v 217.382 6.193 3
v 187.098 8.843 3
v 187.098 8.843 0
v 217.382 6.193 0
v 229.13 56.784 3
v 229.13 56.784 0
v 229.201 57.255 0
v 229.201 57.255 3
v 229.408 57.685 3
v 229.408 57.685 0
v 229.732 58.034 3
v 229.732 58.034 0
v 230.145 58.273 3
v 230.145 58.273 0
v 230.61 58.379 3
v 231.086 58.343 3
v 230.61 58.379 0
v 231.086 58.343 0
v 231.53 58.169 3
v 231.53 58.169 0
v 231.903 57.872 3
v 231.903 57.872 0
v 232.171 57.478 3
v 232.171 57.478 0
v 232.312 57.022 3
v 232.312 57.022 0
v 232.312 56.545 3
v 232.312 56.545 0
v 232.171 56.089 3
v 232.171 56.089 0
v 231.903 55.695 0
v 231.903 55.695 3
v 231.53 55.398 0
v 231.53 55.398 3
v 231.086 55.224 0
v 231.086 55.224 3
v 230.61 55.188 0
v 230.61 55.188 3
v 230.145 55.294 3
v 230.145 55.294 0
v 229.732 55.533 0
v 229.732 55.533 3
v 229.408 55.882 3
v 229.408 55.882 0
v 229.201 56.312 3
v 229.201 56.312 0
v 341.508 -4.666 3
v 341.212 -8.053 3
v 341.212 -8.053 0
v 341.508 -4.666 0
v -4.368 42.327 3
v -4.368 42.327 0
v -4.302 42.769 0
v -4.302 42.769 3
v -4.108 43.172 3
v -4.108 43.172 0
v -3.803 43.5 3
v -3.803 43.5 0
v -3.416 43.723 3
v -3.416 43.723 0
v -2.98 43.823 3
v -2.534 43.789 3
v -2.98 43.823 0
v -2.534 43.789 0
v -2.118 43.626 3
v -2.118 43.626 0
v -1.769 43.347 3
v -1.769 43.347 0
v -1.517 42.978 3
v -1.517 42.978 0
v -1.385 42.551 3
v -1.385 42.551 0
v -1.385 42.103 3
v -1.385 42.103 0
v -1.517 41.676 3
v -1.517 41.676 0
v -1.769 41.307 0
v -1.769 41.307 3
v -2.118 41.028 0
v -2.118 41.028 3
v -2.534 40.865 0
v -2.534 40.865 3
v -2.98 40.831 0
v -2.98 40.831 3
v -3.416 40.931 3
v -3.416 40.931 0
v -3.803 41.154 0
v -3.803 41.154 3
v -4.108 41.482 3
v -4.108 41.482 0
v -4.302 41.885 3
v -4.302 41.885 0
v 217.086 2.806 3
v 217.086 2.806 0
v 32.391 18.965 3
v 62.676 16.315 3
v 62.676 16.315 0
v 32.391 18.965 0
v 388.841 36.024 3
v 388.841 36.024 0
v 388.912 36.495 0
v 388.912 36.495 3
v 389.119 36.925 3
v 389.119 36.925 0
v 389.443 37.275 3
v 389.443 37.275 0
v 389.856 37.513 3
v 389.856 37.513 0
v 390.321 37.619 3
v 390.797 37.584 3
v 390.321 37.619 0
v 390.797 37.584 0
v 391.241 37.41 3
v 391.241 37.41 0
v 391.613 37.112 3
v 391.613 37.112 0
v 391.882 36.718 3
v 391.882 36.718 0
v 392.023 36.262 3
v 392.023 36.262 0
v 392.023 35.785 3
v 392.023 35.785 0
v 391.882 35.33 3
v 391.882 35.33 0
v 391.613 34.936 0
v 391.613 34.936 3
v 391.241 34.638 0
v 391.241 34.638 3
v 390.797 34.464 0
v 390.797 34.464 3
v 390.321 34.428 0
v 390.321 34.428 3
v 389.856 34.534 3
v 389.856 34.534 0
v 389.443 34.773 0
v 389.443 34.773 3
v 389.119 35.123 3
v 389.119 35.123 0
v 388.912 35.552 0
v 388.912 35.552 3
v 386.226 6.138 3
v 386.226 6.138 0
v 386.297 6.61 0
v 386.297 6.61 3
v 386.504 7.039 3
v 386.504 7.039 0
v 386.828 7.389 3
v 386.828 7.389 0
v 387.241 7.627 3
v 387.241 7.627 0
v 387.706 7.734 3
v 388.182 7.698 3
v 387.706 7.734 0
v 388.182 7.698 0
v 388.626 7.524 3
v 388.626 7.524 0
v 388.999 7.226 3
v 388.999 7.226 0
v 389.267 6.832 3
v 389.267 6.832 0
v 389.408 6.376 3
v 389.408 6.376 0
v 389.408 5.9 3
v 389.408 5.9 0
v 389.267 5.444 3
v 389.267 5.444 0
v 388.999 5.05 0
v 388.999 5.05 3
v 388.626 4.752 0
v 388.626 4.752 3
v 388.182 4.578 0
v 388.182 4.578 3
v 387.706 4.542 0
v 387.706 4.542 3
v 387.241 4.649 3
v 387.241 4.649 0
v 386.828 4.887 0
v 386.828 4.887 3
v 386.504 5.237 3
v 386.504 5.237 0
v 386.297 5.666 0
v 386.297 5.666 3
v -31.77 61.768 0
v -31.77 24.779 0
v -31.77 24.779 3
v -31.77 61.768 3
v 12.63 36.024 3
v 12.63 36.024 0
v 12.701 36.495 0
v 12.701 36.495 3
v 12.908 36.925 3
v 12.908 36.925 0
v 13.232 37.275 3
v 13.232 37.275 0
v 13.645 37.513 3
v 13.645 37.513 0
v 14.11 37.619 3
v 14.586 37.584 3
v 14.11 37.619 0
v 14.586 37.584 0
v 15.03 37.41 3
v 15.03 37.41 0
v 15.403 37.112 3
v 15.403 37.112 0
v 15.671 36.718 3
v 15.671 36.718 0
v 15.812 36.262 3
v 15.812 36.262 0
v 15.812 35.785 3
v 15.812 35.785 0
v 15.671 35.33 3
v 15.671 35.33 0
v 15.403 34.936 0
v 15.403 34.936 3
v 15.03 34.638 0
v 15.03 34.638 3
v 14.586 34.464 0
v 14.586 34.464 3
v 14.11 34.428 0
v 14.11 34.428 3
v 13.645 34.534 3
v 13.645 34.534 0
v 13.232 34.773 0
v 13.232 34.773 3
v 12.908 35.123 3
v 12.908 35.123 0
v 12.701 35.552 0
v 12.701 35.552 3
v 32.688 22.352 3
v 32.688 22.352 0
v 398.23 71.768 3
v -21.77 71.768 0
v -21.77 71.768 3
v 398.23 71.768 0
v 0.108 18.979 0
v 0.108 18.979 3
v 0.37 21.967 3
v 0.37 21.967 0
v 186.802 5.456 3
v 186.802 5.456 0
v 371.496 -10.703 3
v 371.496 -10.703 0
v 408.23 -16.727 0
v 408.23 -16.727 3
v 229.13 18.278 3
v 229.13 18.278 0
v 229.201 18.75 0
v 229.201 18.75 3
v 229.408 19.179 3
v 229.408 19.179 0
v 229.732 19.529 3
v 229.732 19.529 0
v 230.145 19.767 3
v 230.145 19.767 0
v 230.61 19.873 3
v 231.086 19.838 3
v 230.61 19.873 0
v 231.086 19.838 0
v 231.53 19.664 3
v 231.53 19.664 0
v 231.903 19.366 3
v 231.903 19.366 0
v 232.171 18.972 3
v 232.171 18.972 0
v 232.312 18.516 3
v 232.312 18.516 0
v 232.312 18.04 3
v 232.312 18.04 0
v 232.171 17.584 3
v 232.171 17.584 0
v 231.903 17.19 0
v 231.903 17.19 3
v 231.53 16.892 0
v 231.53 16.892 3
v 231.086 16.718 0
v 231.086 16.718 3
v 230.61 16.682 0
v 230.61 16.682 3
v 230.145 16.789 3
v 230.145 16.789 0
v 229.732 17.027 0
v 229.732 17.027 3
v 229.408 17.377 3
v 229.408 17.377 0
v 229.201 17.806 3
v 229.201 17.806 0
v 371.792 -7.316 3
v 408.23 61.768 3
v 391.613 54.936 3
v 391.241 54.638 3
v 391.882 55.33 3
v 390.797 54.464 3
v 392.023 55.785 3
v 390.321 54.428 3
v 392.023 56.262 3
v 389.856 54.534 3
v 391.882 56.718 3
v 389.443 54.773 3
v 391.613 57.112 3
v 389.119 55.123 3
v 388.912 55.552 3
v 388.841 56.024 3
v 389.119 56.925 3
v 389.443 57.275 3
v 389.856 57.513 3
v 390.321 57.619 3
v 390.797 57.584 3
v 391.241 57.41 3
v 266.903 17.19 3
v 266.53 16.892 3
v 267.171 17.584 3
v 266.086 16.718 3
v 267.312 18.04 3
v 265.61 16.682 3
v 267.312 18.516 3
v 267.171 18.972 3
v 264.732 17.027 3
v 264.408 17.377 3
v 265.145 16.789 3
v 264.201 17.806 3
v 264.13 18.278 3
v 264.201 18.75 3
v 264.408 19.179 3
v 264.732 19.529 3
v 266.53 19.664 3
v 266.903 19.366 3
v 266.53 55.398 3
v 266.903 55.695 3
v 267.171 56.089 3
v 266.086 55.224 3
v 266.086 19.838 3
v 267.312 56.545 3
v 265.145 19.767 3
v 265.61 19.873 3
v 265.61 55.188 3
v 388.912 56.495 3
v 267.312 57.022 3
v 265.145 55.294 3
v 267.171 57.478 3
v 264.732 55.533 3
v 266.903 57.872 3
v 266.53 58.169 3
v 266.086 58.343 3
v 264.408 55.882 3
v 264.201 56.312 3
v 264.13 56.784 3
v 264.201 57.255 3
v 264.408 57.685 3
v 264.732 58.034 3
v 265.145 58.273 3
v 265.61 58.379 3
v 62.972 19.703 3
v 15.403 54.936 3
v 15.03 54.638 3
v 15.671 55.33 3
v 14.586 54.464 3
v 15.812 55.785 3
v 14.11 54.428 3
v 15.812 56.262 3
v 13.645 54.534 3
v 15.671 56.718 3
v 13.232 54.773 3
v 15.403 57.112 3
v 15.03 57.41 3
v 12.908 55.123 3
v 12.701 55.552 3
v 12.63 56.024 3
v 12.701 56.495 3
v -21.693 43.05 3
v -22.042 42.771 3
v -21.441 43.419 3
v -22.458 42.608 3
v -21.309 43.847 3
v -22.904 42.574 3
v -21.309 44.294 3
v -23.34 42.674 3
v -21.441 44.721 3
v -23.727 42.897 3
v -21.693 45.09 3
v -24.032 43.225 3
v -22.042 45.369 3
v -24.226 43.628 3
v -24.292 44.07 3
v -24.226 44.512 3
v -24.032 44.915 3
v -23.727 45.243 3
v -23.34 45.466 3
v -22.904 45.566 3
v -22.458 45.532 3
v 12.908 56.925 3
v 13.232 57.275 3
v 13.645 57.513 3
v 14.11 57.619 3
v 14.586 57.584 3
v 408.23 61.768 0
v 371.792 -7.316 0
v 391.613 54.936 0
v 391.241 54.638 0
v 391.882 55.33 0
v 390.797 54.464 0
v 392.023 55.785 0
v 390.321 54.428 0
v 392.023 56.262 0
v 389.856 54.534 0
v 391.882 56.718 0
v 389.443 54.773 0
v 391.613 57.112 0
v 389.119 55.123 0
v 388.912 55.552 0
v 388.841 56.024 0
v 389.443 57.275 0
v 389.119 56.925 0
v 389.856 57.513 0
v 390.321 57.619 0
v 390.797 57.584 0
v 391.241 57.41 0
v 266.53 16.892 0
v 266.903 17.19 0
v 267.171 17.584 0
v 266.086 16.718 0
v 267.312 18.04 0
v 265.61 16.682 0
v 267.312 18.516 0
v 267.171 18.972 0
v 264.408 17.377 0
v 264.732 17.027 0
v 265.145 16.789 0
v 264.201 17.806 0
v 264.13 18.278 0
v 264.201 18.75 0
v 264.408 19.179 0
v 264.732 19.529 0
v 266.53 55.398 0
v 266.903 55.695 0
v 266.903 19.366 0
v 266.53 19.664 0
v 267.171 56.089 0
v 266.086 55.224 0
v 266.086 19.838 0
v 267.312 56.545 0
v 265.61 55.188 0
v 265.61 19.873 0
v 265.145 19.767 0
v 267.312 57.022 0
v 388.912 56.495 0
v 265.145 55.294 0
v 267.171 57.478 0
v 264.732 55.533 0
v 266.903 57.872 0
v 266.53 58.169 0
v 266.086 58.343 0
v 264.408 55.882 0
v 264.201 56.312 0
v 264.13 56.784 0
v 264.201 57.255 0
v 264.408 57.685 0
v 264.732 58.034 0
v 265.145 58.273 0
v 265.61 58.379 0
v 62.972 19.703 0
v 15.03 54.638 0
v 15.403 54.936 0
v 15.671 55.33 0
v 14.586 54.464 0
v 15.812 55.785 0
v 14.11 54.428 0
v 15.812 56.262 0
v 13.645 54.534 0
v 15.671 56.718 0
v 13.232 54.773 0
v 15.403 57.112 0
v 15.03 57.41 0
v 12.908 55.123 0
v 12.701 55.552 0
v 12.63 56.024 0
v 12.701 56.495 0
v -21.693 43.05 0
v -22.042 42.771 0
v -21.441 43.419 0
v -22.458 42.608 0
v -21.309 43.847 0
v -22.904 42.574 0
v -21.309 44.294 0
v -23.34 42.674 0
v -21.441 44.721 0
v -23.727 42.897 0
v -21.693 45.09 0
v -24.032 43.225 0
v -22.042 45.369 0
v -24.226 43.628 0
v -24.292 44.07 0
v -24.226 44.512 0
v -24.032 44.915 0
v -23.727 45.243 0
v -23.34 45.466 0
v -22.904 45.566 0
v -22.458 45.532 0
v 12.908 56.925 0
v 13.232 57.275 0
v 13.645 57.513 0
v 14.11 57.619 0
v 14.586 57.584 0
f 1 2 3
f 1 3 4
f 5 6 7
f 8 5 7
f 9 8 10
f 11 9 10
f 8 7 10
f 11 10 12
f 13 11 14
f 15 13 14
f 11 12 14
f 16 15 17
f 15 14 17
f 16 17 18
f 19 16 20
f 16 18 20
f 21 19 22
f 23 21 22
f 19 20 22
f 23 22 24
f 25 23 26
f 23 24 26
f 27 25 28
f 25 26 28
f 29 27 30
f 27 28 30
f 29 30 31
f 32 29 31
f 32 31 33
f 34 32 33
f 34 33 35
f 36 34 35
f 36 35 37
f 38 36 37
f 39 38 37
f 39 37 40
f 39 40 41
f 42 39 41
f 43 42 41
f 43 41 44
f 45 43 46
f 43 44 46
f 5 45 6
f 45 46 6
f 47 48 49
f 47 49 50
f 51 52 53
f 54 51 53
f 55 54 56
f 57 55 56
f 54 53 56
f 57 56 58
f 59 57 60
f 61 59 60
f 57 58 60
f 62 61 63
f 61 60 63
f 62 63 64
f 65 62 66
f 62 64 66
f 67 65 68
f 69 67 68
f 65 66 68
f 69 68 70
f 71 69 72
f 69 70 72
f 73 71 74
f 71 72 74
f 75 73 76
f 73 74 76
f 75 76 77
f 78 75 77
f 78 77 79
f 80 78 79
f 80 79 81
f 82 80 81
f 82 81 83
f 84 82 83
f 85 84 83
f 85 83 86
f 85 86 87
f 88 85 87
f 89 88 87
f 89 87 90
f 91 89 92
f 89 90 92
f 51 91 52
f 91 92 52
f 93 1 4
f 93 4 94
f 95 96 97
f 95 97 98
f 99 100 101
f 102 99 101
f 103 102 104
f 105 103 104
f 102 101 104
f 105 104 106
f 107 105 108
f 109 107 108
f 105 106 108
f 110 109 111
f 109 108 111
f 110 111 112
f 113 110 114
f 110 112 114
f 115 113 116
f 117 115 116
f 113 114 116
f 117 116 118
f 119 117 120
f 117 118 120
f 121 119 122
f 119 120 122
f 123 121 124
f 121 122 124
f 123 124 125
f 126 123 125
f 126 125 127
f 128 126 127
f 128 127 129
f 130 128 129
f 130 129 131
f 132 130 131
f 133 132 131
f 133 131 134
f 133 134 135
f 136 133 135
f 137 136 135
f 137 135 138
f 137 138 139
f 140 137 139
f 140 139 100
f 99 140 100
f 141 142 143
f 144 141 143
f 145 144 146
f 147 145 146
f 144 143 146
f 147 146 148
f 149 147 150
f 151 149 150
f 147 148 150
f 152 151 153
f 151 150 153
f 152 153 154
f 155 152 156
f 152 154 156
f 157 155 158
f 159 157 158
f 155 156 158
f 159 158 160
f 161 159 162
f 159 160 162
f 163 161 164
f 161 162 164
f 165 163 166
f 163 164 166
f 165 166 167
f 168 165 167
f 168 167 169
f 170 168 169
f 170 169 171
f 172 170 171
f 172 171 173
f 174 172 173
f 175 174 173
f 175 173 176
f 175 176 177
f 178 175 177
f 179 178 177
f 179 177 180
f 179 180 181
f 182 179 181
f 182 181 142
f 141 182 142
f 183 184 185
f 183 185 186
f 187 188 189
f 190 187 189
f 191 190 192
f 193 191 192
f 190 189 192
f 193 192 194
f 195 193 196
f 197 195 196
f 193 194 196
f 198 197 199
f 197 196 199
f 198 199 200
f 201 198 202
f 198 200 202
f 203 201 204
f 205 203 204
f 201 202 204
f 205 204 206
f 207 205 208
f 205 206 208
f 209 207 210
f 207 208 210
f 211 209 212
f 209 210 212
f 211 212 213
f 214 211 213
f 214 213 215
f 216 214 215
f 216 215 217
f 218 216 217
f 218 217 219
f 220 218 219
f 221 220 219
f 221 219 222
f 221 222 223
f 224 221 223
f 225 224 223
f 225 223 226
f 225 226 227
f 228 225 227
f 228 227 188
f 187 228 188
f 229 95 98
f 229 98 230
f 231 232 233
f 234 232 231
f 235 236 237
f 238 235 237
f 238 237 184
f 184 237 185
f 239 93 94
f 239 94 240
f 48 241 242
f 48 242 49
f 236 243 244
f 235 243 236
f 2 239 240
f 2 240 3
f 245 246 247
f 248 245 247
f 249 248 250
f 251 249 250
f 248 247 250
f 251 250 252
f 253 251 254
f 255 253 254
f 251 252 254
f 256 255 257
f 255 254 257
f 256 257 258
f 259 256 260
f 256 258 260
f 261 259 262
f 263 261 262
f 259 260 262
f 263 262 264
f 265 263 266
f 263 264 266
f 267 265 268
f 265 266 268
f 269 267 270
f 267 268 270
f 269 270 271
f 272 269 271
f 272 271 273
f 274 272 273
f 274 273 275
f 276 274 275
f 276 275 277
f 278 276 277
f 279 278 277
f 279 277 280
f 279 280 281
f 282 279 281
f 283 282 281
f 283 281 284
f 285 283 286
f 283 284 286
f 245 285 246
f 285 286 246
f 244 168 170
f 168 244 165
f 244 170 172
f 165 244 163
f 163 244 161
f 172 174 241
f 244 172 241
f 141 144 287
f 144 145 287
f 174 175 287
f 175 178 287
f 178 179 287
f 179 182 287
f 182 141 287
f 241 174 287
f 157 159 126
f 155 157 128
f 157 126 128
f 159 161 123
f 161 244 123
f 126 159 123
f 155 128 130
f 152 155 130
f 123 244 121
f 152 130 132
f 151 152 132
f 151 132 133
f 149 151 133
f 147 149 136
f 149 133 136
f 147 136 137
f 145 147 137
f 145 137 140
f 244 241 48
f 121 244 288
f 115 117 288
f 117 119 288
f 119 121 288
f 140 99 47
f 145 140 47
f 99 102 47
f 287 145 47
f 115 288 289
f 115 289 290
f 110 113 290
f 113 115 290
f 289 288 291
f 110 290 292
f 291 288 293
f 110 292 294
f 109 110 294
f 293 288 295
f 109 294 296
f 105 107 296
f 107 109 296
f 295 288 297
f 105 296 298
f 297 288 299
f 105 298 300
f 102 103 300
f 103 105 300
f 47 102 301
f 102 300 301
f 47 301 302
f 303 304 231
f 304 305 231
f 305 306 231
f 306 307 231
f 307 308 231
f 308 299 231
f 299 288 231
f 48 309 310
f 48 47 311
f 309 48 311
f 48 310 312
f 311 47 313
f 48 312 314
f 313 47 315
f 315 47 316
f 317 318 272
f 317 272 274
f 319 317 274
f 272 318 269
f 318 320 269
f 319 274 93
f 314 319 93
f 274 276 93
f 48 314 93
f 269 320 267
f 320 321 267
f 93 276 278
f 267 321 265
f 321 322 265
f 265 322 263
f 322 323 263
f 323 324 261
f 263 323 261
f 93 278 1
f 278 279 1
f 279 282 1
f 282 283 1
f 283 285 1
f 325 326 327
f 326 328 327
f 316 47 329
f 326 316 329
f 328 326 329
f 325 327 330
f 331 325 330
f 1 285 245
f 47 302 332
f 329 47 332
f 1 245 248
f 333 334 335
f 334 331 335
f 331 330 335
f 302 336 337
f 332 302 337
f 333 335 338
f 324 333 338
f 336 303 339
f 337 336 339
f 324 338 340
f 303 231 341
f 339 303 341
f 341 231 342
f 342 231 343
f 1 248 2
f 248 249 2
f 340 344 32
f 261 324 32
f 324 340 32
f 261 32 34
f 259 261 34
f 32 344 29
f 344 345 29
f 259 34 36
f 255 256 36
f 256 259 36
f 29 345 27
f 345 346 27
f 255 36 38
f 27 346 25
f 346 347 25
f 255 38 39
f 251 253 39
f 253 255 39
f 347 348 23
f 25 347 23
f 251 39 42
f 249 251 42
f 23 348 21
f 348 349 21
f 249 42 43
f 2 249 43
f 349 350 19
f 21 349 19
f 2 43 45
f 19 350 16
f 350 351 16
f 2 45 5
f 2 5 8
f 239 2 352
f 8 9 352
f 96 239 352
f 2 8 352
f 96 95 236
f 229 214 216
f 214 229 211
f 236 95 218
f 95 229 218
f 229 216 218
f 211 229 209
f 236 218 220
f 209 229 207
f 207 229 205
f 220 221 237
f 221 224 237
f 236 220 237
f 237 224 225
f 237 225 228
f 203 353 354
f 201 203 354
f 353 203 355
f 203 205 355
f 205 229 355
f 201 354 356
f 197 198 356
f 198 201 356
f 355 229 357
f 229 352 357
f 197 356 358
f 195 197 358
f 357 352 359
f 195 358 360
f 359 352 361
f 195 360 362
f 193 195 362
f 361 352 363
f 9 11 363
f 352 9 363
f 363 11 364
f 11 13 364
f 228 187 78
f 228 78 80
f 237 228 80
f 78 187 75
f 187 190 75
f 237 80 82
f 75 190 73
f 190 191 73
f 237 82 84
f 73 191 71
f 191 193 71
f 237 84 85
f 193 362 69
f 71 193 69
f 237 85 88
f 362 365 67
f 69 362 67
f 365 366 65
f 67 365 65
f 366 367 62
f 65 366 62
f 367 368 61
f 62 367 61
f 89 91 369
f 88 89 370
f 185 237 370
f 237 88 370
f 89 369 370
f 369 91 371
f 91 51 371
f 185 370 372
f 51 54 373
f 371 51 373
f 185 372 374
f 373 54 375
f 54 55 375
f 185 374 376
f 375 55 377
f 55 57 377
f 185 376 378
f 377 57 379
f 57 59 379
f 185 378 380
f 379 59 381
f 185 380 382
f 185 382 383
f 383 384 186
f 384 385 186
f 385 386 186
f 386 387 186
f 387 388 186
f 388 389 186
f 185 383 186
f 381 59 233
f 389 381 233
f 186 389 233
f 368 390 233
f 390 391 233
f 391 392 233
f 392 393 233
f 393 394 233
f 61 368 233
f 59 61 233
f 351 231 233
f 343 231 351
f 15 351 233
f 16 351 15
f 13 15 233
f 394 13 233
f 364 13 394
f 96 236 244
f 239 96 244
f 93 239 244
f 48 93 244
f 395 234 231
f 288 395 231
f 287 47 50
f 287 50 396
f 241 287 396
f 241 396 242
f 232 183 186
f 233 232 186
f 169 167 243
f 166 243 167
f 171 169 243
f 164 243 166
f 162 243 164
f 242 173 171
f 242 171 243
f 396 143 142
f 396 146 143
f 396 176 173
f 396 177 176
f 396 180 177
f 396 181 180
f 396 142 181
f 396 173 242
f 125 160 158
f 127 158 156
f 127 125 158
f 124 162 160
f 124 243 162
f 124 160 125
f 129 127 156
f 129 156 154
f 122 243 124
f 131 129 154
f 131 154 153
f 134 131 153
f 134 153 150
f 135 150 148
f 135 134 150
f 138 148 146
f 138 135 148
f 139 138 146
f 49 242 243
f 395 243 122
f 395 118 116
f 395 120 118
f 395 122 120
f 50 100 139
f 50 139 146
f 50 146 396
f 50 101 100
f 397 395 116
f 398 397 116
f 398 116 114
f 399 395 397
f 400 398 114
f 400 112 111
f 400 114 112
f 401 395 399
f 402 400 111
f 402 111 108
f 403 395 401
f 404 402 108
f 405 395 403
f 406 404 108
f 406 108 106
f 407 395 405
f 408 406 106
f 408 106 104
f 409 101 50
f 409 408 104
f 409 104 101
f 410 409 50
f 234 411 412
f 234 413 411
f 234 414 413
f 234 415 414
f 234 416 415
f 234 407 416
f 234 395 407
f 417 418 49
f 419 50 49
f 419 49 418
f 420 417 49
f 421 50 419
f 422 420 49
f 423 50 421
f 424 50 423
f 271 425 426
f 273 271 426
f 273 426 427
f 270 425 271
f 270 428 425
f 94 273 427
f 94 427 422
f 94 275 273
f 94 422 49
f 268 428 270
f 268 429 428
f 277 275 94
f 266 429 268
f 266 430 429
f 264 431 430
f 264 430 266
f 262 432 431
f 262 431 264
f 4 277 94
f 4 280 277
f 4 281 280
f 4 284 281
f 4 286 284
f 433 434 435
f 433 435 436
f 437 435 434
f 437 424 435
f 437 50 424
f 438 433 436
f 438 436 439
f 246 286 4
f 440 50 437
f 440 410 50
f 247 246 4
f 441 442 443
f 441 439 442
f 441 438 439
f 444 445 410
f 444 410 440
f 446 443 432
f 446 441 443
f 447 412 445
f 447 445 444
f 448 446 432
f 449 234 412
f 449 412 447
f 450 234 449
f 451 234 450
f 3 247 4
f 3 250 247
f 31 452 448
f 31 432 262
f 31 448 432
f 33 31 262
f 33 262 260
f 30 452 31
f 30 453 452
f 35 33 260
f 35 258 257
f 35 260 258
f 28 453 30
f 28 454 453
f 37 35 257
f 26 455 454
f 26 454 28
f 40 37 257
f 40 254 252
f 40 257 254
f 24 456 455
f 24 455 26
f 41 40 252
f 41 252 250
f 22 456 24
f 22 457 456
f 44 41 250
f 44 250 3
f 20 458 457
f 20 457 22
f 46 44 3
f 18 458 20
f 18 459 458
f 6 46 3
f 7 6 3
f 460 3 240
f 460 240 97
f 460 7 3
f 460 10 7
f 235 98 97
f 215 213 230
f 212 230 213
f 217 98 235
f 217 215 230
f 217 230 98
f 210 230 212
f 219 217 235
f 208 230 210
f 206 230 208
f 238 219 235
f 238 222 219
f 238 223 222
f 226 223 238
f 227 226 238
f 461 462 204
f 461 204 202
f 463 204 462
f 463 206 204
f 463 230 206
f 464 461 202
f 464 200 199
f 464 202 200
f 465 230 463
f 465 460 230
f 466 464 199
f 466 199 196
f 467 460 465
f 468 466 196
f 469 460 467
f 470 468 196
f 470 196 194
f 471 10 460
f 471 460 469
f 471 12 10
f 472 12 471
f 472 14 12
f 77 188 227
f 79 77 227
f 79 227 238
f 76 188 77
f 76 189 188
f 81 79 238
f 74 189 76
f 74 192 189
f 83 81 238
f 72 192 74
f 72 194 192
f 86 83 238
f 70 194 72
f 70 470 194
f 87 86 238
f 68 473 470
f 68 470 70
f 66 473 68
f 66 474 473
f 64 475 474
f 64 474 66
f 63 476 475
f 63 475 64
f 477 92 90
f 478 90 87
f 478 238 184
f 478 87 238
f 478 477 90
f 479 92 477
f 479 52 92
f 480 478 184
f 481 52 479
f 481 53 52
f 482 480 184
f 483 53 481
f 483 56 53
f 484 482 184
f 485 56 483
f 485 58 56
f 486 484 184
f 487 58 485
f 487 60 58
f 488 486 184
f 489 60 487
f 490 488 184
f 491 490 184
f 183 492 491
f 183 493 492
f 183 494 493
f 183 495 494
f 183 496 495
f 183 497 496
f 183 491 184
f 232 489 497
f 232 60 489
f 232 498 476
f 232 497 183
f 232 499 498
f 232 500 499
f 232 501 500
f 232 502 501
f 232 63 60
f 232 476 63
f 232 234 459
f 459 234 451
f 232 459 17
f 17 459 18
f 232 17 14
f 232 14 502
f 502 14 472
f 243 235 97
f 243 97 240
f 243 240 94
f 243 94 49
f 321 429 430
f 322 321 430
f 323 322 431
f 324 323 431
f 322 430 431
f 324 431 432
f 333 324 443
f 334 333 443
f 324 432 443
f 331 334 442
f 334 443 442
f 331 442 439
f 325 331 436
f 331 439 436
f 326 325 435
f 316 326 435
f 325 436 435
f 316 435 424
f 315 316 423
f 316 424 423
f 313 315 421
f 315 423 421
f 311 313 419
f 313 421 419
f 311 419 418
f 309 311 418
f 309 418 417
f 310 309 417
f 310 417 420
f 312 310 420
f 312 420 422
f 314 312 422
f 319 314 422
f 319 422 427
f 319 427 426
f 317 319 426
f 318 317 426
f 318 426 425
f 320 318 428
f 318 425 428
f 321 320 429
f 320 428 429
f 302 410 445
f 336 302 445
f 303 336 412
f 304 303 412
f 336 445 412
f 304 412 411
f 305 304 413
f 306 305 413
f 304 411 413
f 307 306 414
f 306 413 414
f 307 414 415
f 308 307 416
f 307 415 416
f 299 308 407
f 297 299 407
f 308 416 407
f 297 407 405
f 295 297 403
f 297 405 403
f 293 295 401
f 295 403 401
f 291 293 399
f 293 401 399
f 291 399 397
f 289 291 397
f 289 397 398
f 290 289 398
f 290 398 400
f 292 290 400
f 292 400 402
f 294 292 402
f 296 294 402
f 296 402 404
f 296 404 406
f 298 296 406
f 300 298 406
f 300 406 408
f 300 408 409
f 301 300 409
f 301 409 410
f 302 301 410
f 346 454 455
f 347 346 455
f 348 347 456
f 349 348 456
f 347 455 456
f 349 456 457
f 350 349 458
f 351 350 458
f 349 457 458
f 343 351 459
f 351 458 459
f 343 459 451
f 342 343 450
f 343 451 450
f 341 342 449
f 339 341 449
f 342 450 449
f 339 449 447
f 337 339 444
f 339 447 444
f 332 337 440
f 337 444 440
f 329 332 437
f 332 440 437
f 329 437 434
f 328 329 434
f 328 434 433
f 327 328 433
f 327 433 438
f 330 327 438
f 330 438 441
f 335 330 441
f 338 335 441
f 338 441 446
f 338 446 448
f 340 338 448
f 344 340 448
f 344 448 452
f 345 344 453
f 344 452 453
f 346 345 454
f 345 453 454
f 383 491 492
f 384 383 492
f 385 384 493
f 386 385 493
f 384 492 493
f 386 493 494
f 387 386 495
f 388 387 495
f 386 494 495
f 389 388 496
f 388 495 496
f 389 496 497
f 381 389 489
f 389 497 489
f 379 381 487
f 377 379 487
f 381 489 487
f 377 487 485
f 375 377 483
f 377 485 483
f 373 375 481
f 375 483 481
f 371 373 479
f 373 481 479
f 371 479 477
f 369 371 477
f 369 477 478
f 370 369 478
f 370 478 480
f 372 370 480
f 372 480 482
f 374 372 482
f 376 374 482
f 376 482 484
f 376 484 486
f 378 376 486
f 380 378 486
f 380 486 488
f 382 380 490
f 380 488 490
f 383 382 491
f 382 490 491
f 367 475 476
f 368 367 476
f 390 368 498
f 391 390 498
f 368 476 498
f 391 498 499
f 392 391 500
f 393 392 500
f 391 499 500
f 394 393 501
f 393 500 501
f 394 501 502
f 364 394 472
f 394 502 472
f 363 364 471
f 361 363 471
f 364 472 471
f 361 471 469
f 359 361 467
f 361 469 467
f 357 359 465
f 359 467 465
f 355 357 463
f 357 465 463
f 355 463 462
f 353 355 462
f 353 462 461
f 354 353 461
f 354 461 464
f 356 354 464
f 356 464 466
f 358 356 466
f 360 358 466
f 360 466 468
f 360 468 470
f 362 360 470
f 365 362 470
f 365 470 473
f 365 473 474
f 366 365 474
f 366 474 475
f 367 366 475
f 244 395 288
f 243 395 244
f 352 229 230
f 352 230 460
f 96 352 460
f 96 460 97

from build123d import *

# Parameters (mm, degrees)
EXTRUDE_1_DEPTH     = 3
CUT_EXTRUDE_2_DEPTH = 10
SKETCH1_R           = 1.5
SKETCH1_R_2         = 1.6
CUT_EXTRUDE2_DEPTH  = 3
CHAMFER1_SIZE       = 10
SKETCH2_R           = 1.6
CUT_EXTRUDE3_DEPTH  = 10
SKETCH3_R           = 1.6
CUT_EXTRUDE4_DEPTH  = 39


with BuildPart() as part:
    # 草图1 → 凸台-拉伸1 (new body)
    with BuildSketch(Plane.XY):
        Polygon((-31.770103996, 71.767703031), (408.229896004, 71.767703031), (408.229896004, -16.727308921), (-31.770103996, 21.767703031), align=None)
    extrude(amount=EXTRUDE_1_DEPTH)

    # 草图3 → 切除-拉伸2 (cut)
    with BuildSketch(Plane.XY.offset(3)):
        Polygon((0.108126343, 18.978719263), (0.369593572, 21.967303357), (-31.770103996, 24.779162543), (-31.770103996, 21.767703031), align=None)
        Polygon((371.792330274, -7.315752), (371.496000749, -10.702813974), (341.211681927, -8.053279394), (341.508011452, -4.666217421), align=None)
        Polygon((217.38215207, 6.193388126), (217.085822544, 2.806326152), (186.801503722, 5.455860732), (187.097833248, 8.842922705), align=None)
        Polygon((62.971973866, 19.702528252), (62.67564434, 16.315466278), (32.391325518, 18.965000858), (32.687655044, 22.352062831), align=None)
    extrude(amount=-CUT_EXTRUDE_2_DEPTH, mode=Mode.SUBTRACT)

    # Sketch1 → Cut-Extrude2 (cut)
    with BuildSketch(Plane(origin=(0, 0, 0), x_dir=(-1, 0, 0), z_dir=(0, 0, -1))):
        with Locations((22.792159026, 44.070090887)):
            Circle(SKETCH1_R)
        with Locations((2.868265064, 42.326976033)):
            Circle(SKETCH1_R)
        with Locations((-230.729896004, 56.783526399)):
            Circle(SKETCH1_R_2)
        with Locations((-230.729896004, 18.2779729)):
            Circle(SKETCH1_R_2)
        with Locations((-265.729896004, 18.2779729)):
            Circle(SKETCH1_R_2)
        with Locations((-265.729896004, 56.783526399)):
            Circle(SKETCH1_R_2)
    extrude(amount=-CUT_EXTRUDE2_DEPTH, mode=Mode.SUBTRACT)

    # Chamfer1
    chamfer1_edges = [part.edges().sort_by_distance(p)[0] for p in [
        (-31.770103996, 71.767703031, 1.5),
        (408.229896004, 71.767703031, 1.5),
    ]]
    chamfer(chamfer1_edges, length=CHAMFER1_SIZE)

    # Sketch2 → Cut-Extrude3 (cut)
    with BuildSketch(Plane(origin=(0, 0, 0), x_dir=(-1, 0, 0), z_dir=(0, 0, -1))):
        with Locations((-390.440589081, 36.023865482)):
            Circle(SKETCH2_R)
        with Locations((-387.825916798, 6.138024539)):
            Circle(SKETCH2_R)
    extrude(amount=-CUT_EXTRUDE3_DEPTH, mode=Mode.SUBTRACT)

    # Sketch3 → Cut-Extrude4 (cut)
    with BuildSketch(Plane(origin=(0, 0, 0), x_dir=(-1, 0, 0), z_dir=(0, 0, -1))):
        with Locations((-390.440589081, 56.023865482)):
            Circle(SKETCH3_R)
        with Locations((-14.229896004, 36.023865482)):
            Circle(SKETCH3_R)
        with Locations((-14.229896004, 56.023865482)):
            Circle(SKETCH3_R)
    extrude(amount=-CUT_EXTRUDE4_DEPTH, mode=Mode.SUBTRACT)


solid = part.part
